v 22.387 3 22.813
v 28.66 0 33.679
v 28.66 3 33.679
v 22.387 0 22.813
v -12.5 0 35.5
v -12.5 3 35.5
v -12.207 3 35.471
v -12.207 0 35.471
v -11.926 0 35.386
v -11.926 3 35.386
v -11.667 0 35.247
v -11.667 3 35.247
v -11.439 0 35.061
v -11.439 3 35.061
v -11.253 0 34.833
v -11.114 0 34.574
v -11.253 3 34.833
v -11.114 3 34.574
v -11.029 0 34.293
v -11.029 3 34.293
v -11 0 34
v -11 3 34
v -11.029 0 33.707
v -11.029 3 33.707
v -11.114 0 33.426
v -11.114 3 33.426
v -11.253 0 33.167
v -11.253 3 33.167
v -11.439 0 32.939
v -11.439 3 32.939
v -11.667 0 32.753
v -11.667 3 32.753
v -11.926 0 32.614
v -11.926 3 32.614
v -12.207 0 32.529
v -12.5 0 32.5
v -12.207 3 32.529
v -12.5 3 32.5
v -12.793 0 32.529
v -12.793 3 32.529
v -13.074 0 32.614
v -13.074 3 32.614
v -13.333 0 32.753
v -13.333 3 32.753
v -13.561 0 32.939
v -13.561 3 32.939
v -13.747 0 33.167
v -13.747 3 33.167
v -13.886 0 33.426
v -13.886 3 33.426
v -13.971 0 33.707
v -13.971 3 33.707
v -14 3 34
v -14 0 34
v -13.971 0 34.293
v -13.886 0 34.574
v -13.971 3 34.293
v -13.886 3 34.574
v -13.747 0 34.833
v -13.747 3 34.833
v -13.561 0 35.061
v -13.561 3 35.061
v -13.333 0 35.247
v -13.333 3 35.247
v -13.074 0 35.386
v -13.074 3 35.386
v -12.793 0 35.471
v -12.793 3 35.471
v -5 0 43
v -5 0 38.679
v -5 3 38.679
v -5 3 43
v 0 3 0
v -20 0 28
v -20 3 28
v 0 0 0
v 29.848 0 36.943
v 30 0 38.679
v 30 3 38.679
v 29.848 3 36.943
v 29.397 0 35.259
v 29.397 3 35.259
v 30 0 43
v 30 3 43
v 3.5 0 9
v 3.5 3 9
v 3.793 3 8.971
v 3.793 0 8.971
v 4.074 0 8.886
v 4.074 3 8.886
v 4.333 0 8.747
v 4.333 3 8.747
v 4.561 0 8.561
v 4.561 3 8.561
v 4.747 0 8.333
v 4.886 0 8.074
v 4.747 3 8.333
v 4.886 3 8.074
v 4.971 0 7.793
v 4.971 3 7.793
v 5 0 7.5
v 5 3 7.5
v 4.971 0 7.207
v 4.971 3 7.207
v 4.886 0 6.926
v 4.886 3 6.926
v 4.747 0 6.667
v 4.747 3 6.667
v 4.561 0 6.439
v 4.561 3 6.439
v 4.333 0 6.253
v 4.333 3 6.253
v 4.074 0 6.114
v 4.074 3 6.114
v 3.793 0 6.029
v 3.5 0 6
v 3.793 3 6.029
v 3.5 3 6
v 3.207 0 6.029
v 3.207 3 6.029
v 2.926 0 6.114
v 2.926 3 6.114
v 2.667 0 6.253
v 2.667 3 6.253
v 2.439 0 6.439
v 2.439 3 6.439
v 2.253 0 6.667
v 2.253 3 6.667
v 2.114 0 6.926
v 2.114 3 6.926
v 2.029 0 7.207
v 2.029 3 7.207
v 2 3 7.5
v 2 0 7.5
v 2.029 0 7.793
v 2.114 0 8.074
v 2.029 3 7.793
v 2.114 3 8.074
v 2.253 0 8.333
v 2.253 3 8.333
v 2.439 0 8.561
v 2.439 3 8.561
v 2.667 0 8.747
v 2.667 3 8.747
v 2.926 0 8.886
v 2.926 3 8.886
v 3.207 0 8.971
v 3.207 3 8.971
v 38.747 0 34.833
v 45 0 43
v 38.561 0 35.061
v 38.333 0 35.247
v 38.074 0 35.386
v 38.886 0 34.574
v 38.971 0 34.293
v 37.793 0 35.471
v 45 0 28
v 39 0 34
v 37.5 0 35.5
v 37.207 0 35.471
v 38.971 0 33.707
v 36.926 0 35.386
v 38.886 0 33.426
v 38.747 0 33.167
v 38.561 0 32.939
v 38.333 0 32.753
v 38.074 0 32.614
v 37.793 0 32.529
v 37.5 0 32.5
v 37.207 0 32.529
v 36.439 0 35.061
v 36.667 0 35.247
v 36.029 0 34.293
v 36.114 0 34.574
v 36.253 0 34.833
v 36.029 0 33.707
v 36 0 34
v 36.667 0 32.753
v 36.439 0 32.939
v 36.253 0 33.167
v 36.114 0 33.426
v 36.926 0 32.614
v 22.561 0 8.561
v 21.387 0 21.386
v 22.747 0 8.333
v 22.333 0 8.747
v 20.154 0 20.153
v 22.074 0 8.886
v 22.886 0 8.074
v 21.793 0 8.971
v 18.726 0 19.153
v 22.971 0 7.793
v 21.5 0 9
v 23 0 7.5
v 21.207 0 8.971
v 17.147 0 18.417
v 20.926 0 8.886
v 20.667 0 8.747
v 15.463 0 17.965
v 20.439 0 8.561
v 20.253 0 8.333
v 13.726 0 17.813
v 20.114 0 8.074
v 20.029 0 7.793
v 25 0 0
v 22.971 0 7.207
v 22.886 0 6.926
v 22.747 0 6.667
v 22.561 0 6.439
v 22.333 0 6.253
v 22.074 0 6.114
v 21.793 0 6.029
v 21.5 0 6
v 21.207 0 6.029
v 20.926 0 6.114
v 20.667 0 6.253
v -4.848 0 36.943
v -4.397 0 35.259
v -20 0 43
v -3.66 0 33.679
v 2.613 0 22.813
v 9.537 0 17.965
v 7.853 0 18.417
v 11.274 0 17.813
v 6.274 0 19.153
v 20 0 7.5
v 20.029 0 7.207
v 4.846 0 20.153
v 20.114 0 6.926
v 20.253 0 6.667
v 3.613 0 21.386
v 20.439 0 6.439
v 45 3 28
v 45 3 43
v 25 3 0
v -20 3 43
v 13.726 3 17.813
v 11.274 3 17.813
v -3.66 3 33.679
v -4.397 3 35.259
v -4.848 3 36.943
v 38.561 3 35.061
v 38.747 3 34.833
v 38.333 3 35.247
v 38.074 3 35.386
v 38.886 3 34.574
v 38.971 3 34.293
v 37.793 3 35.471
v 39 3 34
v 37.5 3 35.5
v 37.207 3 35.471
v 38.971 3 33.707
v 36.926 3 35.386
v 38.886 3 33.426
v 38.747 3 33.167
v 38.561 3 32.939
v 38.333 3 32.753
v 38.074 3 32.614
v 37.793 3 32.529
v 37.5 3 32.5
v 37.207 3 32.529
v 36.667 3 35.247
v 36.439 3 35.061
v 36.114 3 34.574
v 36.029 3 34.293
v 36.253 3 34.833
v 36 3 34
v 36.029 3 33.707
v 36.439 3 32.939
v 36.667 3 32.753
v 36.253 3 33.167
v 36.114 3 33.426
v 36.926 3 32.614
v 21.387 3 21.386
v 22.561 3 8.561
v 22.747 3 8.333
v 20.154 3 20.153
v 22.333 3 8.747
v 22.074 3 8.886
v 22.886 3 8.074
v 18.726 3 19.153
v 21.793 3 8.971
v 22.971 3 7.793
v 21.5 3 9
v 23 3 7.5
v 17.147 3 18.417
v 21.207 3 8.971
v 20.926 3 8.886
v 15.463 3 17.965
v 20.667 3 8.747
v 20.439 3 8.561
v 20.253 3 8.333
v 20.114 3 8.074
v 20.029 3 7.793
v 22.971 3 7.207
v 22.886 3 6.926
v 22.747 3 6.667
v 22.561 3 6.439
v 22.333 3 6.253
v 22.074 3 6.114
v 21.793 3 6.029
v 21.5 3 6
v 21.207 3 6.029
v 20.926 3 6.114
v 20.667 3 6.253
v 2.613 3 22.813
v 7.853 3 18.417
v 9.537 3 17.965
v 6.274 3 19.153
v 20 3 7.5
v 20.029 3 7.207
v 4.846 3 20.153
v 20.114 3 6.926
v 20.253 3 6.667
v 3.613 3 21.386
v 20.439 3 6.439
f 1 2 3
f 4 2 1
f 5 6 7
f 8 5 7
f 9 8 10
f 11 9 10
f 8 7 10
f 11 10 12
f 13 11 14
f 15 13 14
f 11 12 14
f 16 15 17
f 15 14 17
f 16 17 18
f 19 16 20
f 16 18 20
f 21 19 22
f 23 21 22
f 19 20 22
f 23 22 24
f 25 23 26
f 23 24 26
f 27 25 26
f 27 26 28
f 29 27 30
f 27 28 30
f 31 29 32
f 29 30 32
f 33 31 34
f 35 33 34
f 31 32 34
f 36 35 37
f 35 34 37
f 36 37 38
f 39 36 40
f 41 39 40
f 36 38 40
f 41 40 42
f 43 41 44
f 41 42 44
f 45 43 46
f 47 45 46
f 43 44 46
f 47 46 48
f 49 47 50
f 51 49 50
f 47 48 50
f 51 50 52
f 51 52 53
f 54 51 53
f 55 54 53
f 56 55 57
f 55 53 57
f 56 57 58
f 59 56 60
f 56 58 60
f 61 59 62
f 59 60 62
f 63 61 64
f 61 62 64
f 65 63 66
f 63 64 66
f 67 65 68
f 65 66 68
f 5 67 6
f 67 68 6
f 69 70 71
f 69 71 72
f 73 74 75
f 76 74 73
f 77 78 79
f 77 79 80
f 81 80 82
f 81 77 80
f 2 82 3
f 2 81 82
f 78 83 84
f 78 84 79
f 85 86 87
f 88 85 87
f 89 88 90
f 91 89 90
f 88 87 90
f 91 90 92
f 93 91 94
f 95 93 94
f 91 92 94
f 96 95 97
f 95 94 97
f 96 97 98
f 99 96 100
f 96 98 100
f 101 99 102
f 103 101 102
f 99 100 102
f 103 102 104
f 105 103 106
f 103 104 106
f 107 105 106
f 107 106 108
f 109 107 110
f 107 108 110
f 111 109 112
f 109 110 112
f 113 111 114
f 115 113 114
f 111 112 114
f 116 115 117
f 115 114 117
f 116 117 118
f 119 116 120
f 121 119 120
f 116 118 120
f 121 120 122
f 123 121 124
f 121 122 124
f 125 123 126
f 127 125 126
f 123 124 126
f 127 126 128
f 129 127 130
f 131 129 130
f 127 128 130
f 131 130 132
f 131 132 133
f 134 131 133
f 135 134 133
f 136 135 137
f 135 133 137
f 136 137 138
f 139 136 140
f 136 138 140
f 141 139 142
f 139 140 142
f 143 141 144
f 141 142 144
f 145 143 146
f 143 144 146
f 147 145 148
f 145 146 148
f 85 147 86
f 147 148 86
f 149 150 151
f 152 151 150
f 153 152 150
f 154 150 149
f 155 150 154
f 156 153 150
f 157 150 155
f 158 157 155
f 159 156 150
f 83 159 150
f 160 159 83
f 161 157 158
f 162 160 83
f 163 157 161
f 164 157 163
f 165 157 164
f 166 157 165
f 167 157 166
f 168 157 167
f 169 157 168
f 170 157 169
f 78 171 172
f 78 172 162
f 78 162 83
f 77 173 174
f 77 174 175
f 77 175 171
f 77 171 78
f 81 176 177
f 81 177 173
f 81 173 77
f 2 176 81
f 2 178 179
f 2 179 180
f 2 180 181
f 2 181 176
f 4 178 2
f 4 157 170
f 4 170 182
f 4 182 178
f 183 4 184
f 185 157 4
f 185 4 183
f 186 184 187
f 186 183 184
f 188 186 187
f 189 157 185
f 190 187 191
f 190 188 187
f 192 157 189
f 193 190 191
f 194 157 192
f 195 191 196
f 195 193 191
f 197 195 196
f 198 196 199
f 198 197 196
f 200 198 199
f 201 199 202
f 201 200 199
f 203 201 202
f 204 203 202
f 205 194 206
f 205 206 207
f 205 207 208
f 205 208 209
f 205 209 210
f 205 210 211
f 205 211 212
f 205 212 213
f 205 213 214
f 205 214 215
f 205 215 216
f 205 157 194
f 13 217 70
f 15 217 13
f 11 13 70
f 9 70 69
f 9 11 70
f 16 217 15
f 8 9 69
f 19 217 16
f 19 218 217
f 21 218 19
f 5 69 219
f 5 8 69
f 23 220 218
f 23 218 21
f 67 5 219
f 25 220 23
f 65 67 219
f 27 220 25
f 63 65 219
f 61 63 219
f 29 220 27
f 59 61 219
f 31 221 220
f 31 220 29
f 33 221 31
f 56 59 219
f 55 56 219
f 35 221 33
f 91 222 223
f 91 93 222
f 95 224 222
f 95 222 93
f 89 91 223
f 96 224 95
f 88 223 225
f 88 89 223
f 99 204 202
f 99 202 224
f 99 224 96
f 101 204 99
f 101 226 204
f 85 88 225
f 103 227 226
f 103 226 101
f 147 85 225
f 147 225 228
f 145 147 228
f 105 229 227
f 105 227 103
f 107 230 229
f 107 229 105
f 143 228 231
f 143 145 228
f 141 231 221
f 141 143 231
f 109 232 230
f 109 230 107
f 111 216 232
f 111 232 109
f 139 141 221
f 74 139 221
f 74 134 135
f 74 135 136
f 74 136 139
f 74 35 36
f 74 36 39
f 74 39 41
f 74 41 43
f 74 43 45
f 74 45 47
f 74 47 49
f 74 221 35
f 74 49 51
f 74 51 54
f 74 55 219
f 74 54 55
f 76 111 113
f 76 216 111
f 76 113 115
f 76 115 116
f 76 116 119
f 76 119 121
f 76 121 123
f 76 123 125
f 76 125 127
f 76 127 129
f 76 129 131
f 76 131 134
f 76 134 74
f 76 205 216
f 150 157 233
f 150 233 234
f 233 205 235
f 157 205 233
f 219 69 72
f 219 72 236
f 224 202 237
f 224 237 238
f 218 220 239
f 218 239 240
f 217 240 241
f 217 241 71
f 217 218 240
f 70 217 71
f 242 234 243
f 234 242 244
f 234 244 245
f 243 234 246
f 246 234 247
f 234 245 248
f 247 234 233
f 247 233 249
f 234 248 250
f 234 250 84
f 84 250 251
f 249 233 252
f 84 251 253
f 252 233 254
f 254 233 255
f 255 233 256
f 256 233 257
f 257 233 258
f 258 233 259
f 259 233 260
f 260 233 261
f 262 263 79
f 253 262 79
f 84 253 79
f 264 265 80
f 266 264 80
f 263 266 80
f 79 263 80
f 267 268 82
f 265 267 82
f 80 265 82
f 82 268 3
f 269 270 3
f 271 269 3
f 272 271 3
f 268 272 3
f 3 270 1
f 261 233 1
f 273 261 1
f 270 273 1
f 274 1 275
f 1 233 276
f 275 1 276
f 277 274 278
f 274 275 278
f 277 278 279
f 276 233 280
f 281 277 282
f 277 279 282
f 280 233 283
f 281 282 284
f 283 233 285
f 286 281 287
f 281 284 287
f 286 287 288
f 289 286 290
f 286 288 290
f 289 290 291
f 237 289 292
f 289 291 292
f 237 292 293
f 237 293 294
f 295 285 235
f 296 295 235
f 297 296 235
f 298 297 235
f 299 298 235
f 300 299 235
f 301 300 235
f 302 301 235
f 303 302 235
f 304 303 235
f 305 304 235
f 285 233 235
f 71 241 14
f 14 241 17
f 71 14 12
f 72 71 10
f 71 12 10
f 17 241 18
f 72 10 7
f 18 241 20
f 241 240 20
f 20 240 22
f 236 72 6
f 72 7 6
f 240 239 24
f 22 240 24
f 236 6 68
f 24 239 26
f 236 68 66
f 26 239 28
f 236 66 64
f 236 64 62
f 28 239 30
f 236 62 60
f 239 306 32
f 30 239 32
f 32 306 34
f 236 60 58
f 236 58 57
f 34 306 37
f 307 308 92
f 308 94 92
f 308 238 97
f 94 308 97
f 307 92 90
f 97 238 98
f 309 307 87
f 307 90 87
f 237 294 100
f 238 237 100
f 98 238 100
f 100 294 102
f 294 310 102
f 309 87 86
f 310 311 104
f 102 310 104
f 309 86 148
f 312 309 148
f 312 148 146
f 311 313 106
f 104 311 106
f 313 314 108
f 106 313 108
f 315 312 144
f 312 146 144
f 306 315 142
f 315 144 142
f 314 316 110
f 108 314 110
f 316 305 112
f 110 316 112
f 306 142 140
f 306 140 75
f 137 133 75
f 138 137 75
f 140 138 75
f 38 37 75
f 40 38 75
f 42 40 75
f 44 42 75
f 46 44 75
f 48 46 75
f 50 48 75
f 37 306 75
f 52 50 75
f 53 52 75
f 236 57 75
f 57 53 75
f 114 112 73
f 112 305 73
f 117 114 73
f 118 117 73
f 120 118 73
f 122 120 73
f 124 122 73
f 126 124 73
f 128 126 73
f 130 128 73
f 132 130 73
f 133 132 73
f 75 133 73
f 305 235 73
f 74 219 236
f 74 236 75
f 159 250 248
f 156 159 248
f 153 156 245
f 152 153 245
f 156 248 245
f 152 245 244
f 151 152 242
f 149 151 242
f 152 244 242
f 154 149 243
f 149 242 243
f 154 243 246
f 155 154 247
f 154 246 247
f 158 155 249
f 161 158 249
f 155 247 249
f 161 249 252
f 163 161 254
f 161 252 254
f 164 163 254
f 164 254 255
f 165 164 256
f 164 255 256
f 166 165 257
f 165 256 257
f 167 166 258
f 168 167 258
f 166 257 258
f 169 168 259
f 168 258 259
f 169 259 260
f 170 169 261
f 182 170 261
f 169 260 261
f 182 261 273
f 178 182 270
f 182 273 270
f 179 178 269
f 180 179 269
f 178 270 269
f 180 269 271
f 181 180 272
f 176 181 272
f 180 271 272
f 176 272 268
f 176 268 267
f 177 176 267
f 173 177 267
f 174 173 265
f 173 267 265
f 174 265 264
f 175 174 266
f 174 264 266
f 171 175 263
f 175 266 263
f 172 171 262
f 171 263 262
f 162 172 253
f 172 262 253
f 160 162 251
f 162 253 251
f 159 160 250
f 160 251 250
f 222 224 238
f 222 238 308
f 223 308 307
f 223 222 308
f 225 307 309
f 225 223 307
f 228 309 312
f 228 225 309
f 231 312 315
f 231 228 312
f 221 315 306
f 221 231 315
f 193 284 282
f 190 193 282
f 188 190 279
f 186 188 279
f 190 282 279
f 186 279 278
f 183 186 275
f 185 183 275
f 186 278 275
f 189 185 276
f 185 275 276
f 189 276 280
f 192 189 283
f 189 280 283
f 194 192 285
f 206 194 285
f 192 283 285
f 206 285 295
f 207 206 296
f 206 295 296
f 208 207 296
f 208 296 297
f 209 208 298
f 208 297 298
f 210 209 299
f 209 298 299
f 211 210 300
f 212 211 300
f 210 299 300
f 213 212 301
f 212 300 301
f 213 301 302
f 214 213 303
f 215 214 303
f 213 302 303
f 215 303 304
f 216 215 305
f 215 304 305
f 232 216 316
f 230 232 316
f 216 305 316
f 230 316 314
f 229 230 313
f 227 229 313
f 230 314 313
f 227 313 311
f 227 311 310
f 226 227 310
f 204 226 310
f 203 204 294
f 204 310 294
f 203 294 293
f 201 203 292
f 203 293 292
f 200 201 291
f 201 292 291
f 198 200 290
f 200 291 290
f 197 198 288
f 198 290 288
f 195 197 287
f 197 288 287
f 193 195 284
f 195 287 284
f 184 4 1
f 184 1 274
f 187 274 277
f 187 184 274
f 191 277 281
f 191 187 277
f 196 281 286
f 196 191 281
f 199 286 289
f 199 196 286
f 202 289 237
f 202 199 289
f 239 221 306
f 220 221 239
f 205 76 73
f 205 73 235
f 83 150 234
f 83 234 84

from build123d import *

# Parameters (mm, degrees)
EXTRUDE_1_DEPTH     = 3
SKETCH_2_R          = 1.5
CUT_EXTRUDE_1_DEPTH = 3


with BuildPart() as part:
    # 草图1 → 凸台-拉伸1 (new body)
    with BuildSketch(Plane(origin=(0, 0, 0), x_dir=(1, 0, 0), z_dir=(0, 1, 0))):
        with BuildLine():
            Line((0, 0), (25, 0))
            Line((25, 0), (45, -28))
            Line((45, -28), (45, -43))
            Line((45, -43), (30, -43))
            Line((30, -43), (30, -38.679491924))
            ThreePointArc((30, -38.679491924), (29.659258263, -36.091301473), (28.660254038, -33.679491924))
            Line((28.660254038, -33.679491924), (22.386751346, -22.813466521))
            ThreePointArc((22.386751346, -22.813466521), (18.726497308, -19.153212483), (13.726497308, -17.813466521))
            Line((13.726497308, -17.813466521), (11.273502692, -17.813466521))
            ThreePointArc((11.273502692, -17.813466521), (6.273502692, -19.153212483), (2.613248654, -22.813466521))
            Line((2.613248654, -22.813466521), (-3.660254038, -33.679491924))
            ThreePointArc((-3.660254038, -33.679491924), (-4.659258263, -36.091301473), (-5, -38.679491924))
            Line((-5, -38.679491924), (-5, -43))
            Line((-5, -43), (-20, -43))
            Line((-20, -43), (-20, -28))
            Line((-20, -28), (0, 0))
        make_face()
    extrude(amount=EXTRUDE_1_DEPTH)

    # 草图2 → 切除-拉伸1 (cut)
    with BuildSketch(Plane(origin=(0, 3, 0), x_dir=(1, 0, 0), z_dir=(0, 1, 0))):
        with Locations(Location((-12.5, -34, 0), (0, 0, 270))):
            Circle(SKETCH_2_R)
        with Locations(Location((37.5, -34, 0), (0, 0, 270))):
            Circle(SKETCH_2_R)
        with Locations(Location((3.5, -7.5, 0), (0, 0, 270))):
            Circle(SKETCH_2_R)
        with Locations(Location((21.5, -7.5, 0), (0, 0, 270))):
            Circle(SKETCH_2_R)
    extrude(amount=-CUT_EXTRUDE_1_DEPTH, mode=Mode.SUBTRACT)


solid = part.part
